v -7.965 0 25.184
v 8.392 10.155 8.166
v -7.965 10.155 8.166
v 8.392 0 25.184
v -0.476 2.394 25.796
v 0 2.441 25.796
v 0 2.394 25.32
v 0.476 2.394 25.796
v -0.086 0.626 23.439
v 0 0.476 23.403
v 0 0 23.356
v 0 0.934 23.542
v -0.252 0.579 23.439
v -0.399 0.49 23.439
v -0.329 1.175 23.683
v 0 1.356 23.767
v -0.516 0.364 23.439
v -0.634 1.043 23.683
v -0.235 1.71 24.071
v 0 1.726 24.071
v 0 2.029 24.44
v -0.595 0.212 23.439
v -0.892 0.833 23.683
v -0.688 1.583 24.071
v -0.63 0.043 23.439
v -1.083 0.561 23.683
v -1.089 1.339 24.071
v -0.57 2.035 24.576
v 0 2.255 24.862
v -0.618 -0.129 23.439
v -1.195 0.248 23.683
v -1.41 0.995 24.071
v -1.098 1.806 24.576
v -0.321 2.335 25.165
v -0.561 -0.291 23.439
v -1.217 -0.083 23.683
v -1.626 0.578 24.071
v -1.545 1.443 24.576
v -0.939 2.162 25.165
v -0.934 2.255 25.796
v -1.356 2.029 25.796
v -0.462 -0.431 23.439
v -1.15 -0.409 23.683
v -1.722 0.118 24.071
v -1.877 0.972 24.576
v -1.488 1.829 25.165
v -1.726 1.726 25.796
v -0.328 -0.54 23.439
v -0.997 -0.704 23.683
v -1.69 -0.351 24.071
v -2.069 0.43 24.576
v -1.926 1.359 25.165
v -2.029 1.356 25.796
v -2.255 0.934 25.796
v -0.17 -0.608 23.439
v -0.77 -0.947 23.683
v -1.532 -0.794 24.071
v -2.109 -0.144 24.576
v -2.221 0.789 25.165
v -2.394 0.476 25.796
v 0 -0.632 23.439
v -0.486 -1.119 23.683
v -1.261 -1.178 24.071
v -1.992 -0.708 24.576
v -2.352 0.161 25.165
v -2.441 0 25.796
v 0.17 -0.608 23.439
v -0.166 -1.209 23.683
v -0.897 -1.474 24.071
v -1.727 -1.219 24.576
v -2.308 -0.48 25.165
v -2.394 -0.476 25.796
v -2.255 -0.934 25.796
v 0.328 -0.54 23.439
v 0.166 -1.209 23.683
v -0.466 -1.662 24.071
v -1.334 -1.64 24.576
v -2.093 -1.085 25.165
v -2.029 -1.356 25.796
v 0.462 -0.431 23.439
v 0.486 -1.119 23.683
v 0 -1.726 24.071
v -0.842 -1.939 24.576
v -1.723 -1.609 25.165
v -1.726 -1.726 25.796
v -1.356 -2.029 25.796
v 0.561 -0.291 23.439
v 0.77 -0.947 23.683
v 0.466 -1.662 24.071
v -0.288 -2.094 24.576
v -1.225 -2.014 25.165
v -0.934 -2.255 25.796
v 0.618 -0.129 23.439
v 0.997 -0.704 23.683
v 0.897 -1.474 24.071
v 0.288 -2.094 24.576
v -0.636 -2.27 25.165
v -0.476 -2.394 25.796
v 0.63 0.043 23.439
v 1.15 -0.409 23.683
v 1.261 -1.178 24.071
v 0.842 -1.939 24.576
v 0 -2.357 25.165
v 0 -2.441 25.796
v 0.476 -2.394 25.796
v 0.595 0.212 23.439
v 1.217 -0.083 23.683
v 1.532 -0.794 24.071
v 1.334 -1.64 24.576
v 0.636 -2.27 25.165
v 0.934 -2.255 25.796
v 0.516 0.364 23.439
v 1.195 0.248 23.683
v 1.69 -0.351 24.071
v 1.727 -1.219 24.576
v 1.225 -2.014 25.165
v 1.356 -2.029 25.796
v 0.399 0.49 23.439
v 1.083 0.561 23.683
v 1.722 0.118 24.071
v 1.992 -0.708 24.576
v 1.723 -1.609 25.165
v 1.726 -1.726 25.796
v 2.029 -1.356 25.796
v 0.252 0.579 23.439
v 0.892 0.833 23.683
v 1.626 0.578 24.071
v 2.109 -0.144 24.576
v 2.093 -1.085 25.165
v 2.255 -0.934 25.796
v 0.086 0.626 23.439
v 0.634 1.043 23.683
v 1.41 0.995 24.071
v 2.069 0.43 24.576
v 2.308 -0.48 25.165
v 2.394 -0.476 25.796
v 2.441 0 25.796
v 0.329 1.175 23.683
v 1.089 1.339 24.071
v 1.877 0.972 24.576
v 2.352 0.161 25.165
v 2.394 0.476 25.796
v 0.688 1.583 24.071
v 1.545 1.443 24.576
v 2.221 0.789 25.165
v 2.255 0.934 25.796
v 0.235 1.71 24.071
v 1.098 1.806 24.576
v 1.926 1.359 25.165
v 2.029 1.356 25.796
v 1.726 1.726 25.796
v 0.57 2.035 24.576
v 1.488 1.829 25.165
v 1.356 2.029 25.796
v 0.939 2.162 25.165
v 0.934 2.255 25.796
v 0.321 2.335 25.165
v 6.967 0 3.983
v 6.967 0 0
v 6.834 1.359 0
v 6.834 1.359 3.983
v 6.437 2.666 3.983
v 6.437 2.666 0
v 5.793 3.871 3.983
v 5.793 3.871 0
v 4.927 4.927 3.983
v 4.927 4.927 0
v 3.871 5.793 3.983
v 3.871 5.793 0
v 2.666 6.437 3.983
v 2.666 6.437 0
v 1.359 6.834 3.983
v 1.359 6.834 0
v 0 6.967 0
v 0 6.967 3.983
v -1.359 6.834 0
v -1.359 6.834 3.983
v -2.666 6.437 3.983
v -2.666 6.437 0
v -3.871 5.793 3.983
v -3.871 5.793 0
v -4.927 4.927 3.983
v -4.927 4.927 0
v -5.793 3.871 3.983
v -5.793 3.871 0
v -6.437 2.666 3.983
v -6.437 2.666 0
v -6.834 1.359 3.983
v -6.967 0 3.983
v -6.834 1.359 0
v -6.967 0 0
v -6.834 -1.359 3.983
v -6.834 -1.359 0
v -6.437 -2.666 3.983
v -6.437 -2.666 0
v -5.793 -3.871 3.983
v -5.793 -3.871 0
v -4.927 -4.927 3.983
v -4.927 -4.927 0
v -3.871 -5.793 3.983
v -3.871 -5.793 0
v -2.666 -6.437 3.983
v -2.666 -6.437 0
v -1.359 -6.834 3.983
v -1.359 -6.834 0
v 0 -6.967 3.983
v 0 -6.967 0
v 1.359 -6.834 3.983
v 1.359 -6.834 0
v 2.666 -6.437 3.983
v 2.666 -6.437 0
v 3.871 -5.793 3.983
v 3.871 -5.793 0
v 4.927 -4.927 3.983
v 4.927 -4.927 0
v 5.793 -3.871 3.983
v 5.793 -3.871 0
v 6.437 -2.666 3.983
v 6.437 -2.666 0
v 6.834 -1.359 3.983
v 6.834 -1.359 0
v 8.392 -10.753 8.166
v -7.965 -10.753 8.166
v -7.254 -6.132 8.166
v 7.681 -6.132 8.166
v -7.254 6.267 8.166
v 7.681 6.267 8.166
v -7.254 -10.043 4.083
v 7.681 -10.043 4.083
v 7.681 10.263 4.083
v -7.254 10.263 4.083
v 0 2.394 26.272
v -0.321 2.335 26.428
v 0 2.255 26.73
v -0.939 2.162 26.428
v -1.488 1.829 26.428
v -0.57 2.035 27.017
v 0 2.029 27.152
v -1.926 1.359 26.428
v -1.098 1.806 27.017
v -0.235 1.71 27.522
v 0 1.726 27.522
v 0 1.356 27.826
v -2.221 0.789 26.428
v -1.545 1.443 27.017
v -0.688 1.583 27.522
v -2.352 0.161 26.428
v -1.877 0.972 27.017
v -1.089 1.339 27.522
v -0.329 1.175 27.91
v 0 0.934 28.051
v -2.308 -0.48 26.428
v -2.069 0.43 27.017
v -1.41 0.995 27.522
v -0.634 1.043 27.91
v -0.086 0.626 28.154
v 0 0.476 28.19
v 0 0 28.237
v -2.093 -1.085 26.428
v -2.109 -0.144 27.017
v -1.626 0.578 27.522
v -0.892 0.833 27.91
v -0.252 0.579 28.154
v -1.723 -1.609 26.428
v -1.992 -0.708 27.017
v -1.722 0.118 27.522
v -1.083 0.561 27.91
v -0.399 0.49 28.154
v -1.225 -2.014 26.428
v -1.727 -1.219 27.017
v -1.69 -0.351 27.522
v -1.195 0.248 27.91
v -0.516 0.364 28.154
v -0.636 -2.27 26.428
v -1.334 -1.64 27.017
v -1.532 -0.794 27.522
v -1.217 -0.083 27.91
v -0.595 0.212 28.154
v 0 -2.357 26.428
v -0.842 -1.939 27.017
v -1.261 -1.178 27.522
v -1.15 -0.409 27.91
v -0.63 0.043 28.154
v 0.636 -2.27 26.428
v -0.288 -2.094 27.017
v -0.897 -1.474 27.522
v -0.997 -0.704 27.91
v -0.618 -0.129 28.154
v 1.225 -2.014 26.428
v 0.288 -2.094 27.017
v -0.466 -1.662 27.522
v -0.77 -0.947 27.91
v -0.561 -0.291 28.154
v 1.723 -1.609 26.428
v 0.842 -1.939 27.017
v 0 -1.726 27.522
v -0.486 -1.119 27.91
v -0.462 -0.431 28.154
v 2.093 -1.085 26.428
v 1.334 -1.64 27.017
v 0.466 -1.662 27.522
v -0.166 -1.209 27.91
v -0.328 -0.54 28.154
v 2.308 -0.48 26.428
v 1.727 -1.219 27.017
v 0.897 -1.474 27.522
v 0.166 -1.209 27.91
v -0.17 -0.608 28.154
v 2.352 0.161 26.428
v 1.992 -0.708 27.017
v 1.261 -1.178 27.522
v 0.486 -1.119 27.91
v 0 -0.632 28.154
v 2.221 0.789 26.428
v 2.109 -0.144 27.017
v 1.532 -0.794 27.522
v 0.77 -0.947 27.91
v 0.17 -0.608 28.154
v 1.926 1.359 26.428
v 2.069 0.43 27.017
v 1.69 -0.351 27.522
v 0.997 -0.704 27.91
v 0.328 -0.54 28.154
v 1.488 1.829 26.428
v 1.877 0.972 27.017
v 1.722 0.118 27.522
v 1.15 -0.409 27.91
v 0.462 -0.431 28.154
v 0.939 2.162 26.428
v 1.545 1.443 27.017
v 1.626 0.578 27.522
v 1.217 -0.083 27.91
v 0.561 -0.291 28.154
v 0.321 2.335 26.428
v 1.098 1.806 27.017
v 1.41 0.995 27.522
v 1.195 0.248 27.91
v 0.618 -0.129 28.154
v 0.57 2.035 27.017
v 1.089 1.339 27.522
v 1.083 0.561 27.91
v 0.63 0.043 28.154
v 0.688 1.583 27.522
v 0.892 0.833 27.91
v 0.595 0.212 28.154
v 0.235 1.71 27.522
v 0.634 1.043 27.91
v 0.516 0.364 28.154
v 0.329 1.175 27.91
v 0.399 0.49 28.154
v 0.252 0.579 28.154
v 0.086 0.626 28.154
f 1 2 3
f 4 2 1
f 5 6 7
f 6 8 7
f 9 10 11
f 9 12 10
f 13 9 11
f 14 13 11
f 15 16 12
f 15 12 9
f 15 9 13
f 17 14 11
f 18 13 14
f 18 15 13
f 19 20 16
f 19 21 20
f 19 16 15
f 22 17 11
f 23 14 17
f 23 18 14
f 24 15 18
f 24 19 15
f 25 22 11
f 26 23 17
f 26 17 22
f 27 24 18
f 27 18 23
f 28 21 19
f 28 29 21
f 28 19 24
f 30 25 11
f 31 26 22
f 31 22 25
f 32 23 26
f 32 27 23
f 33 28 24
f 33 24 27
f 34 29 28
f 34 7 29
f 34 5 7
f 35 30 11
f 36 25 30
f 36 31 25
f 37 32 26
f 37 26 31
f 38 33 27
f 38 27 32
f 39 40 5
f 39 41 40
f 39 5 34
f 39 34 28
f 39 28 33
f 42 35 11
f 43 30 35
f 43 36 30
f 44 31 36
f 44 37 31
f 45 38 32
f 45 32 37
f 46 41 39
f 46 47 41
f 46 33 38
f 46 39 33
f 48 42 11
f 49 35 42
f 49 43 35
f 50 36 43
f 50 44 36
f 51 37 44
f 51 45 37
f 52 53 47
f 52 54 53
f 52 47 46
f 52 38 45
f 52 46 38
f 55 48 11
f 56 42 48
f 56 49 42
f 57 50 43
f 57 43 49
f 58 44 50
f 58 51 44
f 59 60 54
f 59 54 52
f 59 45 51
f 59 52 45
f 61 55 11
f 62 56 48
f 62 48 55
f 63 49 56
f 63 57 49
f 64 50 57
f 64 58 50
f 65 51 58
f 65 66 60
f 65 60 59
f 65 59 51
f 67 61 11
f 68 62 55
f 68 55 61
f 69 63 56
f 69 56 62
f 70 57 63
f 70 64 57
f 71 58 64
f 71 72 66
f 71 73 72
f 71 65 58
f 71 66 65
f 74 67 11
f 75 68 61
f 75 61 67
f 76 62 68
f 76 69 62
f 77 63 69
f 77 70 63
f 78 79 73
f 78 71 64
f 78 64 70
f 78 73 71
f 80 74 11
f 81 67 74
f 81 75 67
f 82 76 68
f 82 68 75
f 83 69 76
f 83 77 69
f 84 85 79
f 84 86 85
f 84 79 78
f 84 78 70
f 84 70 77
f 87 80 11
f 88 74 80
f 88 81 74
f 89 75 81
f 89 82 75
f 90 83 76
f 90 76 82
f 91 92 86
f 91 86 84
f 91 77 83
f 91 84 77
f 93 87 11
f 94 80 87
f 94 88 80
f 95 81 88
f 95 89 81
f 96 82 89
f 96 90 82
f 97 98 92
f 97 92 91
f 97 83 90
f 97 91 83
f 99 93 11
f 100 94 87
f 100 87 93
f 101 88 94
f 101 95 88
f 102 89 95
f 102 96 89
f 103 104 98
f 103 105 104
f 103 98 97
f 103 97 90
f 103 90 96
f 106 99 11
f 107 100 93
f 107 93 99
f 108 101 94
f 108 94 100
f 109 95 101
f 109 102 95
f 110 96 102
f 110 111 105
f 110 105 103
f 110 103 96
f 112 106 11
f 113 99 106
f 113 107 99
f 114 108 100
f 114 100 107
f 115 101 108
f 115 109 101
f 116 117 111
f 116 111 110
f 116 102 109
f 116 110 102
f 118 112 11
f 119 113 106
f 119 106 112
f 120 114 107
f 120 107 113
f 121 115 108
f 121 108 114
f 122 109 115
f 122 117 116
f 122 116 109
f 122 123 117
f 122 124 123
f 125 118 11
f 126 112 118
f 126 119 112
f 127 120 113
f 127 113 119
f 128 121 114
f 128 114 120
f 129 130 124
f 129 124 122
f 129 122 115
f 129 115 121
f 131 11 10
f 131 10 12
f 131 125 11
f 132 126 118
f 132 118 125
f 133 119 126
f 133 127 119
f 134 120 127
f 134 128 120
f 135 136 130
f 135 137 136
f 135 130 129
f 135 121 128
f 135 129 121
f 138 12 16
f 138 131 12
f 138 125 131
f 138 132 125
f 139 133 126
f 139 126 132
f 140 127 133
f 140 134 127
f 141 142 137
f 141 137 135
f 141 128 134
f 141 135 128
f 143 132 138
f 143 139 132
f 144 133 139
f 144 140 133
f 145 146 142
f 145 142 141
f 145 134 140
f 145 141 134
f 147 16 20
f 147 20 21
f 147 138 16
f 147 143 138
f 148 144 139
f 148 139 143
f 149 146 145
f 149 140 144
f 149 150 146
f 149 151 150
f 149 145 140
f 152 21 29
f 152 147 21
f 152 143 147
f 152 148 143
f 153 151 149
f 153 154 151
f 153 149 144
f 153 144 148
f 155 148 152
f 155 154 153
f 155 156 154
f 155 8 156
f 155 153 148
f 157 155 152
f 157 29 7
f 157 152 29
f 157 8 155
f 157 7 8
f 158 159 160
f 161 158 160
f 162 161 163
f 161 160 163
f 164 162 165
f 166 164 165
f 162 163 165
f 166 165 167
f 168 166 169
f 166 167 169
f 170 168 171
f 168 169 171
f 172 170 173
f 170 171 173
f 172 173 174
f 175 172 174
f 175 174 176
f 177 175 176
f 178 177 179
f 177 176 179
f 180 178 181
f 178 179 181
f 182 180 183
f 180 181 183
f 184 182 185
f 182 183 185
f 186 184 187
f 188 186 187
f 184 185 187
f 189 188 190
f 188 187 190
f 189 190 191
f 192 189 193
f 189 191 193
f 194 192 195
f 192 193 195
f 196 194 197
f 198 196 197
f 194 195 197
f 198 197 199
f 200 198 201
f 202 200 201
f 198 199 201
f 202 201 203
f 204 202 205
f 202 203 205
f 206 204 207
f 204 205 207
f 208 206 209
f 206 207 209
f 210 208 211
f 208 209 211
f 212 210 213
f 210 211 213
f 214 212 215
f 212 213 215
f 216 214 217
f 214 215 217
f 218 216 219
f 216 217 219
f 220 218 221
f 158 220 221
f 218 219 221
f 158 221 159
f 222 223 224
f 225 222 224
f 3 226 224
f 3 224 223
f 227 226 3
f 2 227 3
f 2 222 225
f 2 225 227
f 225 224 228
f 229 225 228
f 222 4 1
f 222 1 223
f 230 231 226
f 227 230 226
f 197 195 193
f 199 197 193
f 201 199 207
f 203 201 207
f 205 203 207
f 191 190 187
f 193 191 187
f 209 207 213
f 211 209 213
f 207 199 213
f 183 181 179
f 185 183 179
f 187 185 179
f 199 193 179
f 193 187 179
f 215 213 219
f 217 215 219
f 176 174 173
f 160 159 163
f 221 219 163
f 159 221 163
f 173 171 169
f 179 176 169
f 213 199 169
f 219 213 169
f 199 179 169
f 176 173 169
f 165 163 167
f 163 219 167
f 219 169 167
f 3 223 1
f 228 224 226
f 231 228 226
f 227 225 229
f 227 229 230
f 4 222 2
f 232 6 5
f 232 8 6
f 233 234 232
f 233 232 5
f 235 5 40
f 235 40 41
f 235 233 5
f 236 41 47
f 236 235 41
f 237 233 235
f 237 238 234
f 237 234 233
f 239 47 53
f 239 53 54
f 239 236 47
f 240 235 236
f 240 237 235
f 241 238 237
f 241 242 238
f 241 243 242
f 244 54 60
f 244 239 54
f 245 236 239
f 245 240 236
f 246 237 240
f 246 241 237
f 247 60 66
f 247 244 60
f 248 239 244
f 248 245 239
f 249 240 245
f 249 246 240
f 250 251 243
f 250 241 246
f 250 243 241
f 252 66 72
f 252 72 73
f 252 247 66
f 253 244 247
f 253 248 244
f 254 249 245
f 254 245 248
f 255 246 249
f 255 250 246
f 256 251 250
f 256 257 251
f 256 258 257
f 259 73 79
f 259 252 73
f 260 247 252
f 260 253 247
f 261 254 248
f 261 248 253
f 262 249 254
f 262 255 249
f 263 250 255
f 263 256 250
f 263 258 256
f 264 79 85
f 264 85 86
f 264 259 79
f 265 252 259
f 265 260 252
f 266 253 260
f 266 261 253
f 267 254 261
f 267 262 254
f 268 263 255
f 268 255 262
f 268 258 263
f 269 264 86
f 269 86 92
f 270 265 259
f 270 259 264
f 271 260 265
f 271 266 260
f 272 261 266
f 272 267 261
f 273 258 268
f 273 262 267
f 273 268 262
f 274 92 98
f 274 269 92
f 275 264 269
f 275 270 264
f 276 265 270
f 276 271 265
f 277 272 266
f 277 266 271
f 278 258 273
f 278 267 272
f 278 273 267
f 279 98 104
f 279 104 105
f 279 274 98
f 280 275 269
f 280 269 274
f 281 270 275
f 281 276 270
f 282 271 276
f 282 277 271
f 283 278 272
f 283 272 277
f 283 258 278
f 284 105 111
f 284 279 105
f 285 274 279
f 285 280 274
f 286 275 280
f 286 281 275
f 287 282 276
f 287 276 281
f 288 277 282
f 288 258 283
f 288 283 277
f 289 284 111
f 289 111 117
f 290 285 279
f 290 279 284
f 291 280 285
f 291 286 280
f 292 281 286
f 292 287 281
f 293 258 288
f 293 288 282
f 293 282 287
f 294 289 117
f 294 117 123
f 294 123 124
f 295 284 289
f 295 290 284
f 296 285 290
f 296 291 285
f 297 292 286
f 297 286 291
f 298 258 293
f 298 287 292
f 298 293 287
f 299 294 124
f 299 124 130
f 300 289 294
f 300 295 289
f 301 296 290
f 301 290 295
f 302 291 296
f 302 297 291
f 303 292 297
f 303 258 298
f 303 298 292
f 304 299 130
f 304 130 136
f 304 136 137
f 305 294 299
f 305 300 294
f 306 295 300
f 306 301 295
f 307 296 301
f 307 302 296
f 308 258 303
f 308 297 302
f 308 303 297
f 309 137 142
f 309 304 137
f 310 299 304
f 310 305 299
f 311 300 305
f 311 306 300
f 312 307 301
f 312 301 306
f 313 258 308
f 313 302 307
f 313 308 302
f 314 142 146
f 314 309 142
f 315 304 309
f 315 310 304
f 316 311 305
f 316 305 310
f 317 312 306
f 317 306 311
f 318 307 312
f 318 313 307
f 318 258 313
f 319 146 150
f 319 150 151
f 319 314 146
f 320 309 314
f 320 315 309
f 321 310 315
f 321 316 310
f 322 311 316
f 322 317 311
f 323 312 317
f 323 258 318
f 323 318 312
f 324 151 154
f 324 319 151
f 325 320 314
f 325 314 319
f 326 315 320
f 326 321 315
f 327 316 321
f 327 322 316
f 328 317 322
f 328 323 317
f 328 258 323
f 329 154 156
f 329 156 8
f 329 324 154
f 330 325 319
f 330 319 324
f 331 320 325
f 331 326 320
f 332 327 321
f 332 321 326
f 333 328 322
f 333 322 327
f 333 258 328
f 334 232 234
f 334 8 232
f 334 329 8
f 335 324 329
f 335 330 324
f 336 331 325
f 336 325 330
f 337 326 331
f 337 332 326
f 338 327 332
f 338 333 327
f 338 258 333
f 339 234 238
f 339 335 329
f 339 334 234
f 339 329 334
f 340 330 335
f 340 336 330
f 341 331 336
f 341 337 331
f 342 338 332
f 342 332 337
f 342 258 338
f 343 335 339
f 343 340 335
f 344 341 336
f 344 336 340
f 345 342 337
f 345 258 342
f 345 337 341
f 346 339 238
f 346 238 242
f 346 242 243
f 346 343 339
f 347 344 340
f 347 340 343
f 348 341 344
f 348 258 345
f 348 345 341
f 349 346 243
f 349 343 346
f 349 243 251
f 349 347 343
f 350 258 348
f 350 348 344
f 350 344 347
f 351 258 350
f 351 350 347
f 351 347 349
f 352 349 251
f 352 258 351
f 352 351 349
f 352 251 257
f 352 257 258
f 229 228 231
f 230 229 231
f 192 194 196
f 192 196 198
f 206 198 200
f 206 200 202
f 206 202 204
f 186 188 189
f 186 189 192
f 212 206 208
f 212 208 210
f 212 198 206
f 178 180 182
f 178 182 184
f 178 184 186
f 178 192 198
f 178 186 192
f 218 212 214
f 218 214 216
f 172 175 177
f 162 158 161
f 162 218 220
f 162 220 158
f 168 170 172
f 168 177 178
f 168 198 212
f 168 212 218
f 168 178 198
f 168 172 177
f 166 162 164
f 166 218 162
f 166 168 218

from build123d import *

# Parameters (mm, degrees)
F0_R      = 12.441905201
F1_DEPTH  = 7.112
F3_DEPTH  = 12.954
F4_DEPTH  = 13.716
F6_DEPTH  = 14.986
F7_DEPTH  = 29.21
F8_SCALE  = 0.8
F11_SCALE = 0.7


with BuildPart() as f1:
    # F0 (on Top) → F1 (new body)
    with BuildSketch(Plane.XY):
        Circle(F0_R)
    extrude(amount=F1_DEPTH)


with BuildPart() as f3:
    # F2 (on Right) → F3 (new body)
    with BuildSketch(Plane.YZ):
        Polygon((-17.9332774132, 7.2915516794), (18.3274131268, 7.2915516794), (0, 26.0131042451), align=None)
    extrude(amount=-F3_DEPTH)

    # F2 (on Right) → F4 (join)
    with BuildSketch(Plane.YZ):
        Polygon((-17.9332774132, 7.2915516794), (18.3274131268, 7.2915516794), (0, 26.0131042451), align=None)
    extrude(amount=F4_DEPTH)

    # F5 (on Right) → F6 (join)
    with BuildSketch(Plane.YZ):
        Polygon((-16.9714745134, 14.5818628371), (18.1345995516, 14.5818628371), (0, 44.9712537229), (-19.2022267729, 14.5818628371), align=None)
    extrude(amount=F6_DEPTH)

    # F7 (add): a face of the model
    f7_faces = [f3.faces().sort_by_distance(p)[0] for p in [
        (14.986, -0.3558757404, 24.711659799),
    ]]
    extrude(f7_faces, amount=-F7_DEPTH)


with BuildPart() as f3_1:
    # F8: moved
    add(f3.part.scale(F8_SCALE))


with BuildPart() as f1_1:
    # F8: moved
    add(f1.part.scale(F8_SCALE))


with BuildPart() as f10:
    # F9 (on Right) → F10 (revolve)
    with BuildSketch(Plane.YZ):
        with BuildLine():
            ThreePointArc((0, 33.3653904855), (2.46533299, 34.3865648457), (3.4865073503, 36.8518978357))
            ThreePointArc((3.4865073503, 36.8518978357), (2.46533299, 39.3172308258), (0, 40.338405186))
            Line((0, 40.338405186), (0, 33.3653904855))
        make_face()
    revolve(axis=Axis((0, 0, 36.8518978357), (0, 0, 1)))


with BuildPart() as f1_2:
    # F11: moved
    add(f1_1.part.scale(F11_SCALE))


with BuildPart() as f3_2:
    # F11: moved
    add(f3_1.part.scale(F11_SCALE))


with BuildPart() as f10_1:
    # F11: moved
    add(f10.part.scale(F11_SCALE))


solid = Compound([f1_2.part, f3_2.part, f10_1.part])
